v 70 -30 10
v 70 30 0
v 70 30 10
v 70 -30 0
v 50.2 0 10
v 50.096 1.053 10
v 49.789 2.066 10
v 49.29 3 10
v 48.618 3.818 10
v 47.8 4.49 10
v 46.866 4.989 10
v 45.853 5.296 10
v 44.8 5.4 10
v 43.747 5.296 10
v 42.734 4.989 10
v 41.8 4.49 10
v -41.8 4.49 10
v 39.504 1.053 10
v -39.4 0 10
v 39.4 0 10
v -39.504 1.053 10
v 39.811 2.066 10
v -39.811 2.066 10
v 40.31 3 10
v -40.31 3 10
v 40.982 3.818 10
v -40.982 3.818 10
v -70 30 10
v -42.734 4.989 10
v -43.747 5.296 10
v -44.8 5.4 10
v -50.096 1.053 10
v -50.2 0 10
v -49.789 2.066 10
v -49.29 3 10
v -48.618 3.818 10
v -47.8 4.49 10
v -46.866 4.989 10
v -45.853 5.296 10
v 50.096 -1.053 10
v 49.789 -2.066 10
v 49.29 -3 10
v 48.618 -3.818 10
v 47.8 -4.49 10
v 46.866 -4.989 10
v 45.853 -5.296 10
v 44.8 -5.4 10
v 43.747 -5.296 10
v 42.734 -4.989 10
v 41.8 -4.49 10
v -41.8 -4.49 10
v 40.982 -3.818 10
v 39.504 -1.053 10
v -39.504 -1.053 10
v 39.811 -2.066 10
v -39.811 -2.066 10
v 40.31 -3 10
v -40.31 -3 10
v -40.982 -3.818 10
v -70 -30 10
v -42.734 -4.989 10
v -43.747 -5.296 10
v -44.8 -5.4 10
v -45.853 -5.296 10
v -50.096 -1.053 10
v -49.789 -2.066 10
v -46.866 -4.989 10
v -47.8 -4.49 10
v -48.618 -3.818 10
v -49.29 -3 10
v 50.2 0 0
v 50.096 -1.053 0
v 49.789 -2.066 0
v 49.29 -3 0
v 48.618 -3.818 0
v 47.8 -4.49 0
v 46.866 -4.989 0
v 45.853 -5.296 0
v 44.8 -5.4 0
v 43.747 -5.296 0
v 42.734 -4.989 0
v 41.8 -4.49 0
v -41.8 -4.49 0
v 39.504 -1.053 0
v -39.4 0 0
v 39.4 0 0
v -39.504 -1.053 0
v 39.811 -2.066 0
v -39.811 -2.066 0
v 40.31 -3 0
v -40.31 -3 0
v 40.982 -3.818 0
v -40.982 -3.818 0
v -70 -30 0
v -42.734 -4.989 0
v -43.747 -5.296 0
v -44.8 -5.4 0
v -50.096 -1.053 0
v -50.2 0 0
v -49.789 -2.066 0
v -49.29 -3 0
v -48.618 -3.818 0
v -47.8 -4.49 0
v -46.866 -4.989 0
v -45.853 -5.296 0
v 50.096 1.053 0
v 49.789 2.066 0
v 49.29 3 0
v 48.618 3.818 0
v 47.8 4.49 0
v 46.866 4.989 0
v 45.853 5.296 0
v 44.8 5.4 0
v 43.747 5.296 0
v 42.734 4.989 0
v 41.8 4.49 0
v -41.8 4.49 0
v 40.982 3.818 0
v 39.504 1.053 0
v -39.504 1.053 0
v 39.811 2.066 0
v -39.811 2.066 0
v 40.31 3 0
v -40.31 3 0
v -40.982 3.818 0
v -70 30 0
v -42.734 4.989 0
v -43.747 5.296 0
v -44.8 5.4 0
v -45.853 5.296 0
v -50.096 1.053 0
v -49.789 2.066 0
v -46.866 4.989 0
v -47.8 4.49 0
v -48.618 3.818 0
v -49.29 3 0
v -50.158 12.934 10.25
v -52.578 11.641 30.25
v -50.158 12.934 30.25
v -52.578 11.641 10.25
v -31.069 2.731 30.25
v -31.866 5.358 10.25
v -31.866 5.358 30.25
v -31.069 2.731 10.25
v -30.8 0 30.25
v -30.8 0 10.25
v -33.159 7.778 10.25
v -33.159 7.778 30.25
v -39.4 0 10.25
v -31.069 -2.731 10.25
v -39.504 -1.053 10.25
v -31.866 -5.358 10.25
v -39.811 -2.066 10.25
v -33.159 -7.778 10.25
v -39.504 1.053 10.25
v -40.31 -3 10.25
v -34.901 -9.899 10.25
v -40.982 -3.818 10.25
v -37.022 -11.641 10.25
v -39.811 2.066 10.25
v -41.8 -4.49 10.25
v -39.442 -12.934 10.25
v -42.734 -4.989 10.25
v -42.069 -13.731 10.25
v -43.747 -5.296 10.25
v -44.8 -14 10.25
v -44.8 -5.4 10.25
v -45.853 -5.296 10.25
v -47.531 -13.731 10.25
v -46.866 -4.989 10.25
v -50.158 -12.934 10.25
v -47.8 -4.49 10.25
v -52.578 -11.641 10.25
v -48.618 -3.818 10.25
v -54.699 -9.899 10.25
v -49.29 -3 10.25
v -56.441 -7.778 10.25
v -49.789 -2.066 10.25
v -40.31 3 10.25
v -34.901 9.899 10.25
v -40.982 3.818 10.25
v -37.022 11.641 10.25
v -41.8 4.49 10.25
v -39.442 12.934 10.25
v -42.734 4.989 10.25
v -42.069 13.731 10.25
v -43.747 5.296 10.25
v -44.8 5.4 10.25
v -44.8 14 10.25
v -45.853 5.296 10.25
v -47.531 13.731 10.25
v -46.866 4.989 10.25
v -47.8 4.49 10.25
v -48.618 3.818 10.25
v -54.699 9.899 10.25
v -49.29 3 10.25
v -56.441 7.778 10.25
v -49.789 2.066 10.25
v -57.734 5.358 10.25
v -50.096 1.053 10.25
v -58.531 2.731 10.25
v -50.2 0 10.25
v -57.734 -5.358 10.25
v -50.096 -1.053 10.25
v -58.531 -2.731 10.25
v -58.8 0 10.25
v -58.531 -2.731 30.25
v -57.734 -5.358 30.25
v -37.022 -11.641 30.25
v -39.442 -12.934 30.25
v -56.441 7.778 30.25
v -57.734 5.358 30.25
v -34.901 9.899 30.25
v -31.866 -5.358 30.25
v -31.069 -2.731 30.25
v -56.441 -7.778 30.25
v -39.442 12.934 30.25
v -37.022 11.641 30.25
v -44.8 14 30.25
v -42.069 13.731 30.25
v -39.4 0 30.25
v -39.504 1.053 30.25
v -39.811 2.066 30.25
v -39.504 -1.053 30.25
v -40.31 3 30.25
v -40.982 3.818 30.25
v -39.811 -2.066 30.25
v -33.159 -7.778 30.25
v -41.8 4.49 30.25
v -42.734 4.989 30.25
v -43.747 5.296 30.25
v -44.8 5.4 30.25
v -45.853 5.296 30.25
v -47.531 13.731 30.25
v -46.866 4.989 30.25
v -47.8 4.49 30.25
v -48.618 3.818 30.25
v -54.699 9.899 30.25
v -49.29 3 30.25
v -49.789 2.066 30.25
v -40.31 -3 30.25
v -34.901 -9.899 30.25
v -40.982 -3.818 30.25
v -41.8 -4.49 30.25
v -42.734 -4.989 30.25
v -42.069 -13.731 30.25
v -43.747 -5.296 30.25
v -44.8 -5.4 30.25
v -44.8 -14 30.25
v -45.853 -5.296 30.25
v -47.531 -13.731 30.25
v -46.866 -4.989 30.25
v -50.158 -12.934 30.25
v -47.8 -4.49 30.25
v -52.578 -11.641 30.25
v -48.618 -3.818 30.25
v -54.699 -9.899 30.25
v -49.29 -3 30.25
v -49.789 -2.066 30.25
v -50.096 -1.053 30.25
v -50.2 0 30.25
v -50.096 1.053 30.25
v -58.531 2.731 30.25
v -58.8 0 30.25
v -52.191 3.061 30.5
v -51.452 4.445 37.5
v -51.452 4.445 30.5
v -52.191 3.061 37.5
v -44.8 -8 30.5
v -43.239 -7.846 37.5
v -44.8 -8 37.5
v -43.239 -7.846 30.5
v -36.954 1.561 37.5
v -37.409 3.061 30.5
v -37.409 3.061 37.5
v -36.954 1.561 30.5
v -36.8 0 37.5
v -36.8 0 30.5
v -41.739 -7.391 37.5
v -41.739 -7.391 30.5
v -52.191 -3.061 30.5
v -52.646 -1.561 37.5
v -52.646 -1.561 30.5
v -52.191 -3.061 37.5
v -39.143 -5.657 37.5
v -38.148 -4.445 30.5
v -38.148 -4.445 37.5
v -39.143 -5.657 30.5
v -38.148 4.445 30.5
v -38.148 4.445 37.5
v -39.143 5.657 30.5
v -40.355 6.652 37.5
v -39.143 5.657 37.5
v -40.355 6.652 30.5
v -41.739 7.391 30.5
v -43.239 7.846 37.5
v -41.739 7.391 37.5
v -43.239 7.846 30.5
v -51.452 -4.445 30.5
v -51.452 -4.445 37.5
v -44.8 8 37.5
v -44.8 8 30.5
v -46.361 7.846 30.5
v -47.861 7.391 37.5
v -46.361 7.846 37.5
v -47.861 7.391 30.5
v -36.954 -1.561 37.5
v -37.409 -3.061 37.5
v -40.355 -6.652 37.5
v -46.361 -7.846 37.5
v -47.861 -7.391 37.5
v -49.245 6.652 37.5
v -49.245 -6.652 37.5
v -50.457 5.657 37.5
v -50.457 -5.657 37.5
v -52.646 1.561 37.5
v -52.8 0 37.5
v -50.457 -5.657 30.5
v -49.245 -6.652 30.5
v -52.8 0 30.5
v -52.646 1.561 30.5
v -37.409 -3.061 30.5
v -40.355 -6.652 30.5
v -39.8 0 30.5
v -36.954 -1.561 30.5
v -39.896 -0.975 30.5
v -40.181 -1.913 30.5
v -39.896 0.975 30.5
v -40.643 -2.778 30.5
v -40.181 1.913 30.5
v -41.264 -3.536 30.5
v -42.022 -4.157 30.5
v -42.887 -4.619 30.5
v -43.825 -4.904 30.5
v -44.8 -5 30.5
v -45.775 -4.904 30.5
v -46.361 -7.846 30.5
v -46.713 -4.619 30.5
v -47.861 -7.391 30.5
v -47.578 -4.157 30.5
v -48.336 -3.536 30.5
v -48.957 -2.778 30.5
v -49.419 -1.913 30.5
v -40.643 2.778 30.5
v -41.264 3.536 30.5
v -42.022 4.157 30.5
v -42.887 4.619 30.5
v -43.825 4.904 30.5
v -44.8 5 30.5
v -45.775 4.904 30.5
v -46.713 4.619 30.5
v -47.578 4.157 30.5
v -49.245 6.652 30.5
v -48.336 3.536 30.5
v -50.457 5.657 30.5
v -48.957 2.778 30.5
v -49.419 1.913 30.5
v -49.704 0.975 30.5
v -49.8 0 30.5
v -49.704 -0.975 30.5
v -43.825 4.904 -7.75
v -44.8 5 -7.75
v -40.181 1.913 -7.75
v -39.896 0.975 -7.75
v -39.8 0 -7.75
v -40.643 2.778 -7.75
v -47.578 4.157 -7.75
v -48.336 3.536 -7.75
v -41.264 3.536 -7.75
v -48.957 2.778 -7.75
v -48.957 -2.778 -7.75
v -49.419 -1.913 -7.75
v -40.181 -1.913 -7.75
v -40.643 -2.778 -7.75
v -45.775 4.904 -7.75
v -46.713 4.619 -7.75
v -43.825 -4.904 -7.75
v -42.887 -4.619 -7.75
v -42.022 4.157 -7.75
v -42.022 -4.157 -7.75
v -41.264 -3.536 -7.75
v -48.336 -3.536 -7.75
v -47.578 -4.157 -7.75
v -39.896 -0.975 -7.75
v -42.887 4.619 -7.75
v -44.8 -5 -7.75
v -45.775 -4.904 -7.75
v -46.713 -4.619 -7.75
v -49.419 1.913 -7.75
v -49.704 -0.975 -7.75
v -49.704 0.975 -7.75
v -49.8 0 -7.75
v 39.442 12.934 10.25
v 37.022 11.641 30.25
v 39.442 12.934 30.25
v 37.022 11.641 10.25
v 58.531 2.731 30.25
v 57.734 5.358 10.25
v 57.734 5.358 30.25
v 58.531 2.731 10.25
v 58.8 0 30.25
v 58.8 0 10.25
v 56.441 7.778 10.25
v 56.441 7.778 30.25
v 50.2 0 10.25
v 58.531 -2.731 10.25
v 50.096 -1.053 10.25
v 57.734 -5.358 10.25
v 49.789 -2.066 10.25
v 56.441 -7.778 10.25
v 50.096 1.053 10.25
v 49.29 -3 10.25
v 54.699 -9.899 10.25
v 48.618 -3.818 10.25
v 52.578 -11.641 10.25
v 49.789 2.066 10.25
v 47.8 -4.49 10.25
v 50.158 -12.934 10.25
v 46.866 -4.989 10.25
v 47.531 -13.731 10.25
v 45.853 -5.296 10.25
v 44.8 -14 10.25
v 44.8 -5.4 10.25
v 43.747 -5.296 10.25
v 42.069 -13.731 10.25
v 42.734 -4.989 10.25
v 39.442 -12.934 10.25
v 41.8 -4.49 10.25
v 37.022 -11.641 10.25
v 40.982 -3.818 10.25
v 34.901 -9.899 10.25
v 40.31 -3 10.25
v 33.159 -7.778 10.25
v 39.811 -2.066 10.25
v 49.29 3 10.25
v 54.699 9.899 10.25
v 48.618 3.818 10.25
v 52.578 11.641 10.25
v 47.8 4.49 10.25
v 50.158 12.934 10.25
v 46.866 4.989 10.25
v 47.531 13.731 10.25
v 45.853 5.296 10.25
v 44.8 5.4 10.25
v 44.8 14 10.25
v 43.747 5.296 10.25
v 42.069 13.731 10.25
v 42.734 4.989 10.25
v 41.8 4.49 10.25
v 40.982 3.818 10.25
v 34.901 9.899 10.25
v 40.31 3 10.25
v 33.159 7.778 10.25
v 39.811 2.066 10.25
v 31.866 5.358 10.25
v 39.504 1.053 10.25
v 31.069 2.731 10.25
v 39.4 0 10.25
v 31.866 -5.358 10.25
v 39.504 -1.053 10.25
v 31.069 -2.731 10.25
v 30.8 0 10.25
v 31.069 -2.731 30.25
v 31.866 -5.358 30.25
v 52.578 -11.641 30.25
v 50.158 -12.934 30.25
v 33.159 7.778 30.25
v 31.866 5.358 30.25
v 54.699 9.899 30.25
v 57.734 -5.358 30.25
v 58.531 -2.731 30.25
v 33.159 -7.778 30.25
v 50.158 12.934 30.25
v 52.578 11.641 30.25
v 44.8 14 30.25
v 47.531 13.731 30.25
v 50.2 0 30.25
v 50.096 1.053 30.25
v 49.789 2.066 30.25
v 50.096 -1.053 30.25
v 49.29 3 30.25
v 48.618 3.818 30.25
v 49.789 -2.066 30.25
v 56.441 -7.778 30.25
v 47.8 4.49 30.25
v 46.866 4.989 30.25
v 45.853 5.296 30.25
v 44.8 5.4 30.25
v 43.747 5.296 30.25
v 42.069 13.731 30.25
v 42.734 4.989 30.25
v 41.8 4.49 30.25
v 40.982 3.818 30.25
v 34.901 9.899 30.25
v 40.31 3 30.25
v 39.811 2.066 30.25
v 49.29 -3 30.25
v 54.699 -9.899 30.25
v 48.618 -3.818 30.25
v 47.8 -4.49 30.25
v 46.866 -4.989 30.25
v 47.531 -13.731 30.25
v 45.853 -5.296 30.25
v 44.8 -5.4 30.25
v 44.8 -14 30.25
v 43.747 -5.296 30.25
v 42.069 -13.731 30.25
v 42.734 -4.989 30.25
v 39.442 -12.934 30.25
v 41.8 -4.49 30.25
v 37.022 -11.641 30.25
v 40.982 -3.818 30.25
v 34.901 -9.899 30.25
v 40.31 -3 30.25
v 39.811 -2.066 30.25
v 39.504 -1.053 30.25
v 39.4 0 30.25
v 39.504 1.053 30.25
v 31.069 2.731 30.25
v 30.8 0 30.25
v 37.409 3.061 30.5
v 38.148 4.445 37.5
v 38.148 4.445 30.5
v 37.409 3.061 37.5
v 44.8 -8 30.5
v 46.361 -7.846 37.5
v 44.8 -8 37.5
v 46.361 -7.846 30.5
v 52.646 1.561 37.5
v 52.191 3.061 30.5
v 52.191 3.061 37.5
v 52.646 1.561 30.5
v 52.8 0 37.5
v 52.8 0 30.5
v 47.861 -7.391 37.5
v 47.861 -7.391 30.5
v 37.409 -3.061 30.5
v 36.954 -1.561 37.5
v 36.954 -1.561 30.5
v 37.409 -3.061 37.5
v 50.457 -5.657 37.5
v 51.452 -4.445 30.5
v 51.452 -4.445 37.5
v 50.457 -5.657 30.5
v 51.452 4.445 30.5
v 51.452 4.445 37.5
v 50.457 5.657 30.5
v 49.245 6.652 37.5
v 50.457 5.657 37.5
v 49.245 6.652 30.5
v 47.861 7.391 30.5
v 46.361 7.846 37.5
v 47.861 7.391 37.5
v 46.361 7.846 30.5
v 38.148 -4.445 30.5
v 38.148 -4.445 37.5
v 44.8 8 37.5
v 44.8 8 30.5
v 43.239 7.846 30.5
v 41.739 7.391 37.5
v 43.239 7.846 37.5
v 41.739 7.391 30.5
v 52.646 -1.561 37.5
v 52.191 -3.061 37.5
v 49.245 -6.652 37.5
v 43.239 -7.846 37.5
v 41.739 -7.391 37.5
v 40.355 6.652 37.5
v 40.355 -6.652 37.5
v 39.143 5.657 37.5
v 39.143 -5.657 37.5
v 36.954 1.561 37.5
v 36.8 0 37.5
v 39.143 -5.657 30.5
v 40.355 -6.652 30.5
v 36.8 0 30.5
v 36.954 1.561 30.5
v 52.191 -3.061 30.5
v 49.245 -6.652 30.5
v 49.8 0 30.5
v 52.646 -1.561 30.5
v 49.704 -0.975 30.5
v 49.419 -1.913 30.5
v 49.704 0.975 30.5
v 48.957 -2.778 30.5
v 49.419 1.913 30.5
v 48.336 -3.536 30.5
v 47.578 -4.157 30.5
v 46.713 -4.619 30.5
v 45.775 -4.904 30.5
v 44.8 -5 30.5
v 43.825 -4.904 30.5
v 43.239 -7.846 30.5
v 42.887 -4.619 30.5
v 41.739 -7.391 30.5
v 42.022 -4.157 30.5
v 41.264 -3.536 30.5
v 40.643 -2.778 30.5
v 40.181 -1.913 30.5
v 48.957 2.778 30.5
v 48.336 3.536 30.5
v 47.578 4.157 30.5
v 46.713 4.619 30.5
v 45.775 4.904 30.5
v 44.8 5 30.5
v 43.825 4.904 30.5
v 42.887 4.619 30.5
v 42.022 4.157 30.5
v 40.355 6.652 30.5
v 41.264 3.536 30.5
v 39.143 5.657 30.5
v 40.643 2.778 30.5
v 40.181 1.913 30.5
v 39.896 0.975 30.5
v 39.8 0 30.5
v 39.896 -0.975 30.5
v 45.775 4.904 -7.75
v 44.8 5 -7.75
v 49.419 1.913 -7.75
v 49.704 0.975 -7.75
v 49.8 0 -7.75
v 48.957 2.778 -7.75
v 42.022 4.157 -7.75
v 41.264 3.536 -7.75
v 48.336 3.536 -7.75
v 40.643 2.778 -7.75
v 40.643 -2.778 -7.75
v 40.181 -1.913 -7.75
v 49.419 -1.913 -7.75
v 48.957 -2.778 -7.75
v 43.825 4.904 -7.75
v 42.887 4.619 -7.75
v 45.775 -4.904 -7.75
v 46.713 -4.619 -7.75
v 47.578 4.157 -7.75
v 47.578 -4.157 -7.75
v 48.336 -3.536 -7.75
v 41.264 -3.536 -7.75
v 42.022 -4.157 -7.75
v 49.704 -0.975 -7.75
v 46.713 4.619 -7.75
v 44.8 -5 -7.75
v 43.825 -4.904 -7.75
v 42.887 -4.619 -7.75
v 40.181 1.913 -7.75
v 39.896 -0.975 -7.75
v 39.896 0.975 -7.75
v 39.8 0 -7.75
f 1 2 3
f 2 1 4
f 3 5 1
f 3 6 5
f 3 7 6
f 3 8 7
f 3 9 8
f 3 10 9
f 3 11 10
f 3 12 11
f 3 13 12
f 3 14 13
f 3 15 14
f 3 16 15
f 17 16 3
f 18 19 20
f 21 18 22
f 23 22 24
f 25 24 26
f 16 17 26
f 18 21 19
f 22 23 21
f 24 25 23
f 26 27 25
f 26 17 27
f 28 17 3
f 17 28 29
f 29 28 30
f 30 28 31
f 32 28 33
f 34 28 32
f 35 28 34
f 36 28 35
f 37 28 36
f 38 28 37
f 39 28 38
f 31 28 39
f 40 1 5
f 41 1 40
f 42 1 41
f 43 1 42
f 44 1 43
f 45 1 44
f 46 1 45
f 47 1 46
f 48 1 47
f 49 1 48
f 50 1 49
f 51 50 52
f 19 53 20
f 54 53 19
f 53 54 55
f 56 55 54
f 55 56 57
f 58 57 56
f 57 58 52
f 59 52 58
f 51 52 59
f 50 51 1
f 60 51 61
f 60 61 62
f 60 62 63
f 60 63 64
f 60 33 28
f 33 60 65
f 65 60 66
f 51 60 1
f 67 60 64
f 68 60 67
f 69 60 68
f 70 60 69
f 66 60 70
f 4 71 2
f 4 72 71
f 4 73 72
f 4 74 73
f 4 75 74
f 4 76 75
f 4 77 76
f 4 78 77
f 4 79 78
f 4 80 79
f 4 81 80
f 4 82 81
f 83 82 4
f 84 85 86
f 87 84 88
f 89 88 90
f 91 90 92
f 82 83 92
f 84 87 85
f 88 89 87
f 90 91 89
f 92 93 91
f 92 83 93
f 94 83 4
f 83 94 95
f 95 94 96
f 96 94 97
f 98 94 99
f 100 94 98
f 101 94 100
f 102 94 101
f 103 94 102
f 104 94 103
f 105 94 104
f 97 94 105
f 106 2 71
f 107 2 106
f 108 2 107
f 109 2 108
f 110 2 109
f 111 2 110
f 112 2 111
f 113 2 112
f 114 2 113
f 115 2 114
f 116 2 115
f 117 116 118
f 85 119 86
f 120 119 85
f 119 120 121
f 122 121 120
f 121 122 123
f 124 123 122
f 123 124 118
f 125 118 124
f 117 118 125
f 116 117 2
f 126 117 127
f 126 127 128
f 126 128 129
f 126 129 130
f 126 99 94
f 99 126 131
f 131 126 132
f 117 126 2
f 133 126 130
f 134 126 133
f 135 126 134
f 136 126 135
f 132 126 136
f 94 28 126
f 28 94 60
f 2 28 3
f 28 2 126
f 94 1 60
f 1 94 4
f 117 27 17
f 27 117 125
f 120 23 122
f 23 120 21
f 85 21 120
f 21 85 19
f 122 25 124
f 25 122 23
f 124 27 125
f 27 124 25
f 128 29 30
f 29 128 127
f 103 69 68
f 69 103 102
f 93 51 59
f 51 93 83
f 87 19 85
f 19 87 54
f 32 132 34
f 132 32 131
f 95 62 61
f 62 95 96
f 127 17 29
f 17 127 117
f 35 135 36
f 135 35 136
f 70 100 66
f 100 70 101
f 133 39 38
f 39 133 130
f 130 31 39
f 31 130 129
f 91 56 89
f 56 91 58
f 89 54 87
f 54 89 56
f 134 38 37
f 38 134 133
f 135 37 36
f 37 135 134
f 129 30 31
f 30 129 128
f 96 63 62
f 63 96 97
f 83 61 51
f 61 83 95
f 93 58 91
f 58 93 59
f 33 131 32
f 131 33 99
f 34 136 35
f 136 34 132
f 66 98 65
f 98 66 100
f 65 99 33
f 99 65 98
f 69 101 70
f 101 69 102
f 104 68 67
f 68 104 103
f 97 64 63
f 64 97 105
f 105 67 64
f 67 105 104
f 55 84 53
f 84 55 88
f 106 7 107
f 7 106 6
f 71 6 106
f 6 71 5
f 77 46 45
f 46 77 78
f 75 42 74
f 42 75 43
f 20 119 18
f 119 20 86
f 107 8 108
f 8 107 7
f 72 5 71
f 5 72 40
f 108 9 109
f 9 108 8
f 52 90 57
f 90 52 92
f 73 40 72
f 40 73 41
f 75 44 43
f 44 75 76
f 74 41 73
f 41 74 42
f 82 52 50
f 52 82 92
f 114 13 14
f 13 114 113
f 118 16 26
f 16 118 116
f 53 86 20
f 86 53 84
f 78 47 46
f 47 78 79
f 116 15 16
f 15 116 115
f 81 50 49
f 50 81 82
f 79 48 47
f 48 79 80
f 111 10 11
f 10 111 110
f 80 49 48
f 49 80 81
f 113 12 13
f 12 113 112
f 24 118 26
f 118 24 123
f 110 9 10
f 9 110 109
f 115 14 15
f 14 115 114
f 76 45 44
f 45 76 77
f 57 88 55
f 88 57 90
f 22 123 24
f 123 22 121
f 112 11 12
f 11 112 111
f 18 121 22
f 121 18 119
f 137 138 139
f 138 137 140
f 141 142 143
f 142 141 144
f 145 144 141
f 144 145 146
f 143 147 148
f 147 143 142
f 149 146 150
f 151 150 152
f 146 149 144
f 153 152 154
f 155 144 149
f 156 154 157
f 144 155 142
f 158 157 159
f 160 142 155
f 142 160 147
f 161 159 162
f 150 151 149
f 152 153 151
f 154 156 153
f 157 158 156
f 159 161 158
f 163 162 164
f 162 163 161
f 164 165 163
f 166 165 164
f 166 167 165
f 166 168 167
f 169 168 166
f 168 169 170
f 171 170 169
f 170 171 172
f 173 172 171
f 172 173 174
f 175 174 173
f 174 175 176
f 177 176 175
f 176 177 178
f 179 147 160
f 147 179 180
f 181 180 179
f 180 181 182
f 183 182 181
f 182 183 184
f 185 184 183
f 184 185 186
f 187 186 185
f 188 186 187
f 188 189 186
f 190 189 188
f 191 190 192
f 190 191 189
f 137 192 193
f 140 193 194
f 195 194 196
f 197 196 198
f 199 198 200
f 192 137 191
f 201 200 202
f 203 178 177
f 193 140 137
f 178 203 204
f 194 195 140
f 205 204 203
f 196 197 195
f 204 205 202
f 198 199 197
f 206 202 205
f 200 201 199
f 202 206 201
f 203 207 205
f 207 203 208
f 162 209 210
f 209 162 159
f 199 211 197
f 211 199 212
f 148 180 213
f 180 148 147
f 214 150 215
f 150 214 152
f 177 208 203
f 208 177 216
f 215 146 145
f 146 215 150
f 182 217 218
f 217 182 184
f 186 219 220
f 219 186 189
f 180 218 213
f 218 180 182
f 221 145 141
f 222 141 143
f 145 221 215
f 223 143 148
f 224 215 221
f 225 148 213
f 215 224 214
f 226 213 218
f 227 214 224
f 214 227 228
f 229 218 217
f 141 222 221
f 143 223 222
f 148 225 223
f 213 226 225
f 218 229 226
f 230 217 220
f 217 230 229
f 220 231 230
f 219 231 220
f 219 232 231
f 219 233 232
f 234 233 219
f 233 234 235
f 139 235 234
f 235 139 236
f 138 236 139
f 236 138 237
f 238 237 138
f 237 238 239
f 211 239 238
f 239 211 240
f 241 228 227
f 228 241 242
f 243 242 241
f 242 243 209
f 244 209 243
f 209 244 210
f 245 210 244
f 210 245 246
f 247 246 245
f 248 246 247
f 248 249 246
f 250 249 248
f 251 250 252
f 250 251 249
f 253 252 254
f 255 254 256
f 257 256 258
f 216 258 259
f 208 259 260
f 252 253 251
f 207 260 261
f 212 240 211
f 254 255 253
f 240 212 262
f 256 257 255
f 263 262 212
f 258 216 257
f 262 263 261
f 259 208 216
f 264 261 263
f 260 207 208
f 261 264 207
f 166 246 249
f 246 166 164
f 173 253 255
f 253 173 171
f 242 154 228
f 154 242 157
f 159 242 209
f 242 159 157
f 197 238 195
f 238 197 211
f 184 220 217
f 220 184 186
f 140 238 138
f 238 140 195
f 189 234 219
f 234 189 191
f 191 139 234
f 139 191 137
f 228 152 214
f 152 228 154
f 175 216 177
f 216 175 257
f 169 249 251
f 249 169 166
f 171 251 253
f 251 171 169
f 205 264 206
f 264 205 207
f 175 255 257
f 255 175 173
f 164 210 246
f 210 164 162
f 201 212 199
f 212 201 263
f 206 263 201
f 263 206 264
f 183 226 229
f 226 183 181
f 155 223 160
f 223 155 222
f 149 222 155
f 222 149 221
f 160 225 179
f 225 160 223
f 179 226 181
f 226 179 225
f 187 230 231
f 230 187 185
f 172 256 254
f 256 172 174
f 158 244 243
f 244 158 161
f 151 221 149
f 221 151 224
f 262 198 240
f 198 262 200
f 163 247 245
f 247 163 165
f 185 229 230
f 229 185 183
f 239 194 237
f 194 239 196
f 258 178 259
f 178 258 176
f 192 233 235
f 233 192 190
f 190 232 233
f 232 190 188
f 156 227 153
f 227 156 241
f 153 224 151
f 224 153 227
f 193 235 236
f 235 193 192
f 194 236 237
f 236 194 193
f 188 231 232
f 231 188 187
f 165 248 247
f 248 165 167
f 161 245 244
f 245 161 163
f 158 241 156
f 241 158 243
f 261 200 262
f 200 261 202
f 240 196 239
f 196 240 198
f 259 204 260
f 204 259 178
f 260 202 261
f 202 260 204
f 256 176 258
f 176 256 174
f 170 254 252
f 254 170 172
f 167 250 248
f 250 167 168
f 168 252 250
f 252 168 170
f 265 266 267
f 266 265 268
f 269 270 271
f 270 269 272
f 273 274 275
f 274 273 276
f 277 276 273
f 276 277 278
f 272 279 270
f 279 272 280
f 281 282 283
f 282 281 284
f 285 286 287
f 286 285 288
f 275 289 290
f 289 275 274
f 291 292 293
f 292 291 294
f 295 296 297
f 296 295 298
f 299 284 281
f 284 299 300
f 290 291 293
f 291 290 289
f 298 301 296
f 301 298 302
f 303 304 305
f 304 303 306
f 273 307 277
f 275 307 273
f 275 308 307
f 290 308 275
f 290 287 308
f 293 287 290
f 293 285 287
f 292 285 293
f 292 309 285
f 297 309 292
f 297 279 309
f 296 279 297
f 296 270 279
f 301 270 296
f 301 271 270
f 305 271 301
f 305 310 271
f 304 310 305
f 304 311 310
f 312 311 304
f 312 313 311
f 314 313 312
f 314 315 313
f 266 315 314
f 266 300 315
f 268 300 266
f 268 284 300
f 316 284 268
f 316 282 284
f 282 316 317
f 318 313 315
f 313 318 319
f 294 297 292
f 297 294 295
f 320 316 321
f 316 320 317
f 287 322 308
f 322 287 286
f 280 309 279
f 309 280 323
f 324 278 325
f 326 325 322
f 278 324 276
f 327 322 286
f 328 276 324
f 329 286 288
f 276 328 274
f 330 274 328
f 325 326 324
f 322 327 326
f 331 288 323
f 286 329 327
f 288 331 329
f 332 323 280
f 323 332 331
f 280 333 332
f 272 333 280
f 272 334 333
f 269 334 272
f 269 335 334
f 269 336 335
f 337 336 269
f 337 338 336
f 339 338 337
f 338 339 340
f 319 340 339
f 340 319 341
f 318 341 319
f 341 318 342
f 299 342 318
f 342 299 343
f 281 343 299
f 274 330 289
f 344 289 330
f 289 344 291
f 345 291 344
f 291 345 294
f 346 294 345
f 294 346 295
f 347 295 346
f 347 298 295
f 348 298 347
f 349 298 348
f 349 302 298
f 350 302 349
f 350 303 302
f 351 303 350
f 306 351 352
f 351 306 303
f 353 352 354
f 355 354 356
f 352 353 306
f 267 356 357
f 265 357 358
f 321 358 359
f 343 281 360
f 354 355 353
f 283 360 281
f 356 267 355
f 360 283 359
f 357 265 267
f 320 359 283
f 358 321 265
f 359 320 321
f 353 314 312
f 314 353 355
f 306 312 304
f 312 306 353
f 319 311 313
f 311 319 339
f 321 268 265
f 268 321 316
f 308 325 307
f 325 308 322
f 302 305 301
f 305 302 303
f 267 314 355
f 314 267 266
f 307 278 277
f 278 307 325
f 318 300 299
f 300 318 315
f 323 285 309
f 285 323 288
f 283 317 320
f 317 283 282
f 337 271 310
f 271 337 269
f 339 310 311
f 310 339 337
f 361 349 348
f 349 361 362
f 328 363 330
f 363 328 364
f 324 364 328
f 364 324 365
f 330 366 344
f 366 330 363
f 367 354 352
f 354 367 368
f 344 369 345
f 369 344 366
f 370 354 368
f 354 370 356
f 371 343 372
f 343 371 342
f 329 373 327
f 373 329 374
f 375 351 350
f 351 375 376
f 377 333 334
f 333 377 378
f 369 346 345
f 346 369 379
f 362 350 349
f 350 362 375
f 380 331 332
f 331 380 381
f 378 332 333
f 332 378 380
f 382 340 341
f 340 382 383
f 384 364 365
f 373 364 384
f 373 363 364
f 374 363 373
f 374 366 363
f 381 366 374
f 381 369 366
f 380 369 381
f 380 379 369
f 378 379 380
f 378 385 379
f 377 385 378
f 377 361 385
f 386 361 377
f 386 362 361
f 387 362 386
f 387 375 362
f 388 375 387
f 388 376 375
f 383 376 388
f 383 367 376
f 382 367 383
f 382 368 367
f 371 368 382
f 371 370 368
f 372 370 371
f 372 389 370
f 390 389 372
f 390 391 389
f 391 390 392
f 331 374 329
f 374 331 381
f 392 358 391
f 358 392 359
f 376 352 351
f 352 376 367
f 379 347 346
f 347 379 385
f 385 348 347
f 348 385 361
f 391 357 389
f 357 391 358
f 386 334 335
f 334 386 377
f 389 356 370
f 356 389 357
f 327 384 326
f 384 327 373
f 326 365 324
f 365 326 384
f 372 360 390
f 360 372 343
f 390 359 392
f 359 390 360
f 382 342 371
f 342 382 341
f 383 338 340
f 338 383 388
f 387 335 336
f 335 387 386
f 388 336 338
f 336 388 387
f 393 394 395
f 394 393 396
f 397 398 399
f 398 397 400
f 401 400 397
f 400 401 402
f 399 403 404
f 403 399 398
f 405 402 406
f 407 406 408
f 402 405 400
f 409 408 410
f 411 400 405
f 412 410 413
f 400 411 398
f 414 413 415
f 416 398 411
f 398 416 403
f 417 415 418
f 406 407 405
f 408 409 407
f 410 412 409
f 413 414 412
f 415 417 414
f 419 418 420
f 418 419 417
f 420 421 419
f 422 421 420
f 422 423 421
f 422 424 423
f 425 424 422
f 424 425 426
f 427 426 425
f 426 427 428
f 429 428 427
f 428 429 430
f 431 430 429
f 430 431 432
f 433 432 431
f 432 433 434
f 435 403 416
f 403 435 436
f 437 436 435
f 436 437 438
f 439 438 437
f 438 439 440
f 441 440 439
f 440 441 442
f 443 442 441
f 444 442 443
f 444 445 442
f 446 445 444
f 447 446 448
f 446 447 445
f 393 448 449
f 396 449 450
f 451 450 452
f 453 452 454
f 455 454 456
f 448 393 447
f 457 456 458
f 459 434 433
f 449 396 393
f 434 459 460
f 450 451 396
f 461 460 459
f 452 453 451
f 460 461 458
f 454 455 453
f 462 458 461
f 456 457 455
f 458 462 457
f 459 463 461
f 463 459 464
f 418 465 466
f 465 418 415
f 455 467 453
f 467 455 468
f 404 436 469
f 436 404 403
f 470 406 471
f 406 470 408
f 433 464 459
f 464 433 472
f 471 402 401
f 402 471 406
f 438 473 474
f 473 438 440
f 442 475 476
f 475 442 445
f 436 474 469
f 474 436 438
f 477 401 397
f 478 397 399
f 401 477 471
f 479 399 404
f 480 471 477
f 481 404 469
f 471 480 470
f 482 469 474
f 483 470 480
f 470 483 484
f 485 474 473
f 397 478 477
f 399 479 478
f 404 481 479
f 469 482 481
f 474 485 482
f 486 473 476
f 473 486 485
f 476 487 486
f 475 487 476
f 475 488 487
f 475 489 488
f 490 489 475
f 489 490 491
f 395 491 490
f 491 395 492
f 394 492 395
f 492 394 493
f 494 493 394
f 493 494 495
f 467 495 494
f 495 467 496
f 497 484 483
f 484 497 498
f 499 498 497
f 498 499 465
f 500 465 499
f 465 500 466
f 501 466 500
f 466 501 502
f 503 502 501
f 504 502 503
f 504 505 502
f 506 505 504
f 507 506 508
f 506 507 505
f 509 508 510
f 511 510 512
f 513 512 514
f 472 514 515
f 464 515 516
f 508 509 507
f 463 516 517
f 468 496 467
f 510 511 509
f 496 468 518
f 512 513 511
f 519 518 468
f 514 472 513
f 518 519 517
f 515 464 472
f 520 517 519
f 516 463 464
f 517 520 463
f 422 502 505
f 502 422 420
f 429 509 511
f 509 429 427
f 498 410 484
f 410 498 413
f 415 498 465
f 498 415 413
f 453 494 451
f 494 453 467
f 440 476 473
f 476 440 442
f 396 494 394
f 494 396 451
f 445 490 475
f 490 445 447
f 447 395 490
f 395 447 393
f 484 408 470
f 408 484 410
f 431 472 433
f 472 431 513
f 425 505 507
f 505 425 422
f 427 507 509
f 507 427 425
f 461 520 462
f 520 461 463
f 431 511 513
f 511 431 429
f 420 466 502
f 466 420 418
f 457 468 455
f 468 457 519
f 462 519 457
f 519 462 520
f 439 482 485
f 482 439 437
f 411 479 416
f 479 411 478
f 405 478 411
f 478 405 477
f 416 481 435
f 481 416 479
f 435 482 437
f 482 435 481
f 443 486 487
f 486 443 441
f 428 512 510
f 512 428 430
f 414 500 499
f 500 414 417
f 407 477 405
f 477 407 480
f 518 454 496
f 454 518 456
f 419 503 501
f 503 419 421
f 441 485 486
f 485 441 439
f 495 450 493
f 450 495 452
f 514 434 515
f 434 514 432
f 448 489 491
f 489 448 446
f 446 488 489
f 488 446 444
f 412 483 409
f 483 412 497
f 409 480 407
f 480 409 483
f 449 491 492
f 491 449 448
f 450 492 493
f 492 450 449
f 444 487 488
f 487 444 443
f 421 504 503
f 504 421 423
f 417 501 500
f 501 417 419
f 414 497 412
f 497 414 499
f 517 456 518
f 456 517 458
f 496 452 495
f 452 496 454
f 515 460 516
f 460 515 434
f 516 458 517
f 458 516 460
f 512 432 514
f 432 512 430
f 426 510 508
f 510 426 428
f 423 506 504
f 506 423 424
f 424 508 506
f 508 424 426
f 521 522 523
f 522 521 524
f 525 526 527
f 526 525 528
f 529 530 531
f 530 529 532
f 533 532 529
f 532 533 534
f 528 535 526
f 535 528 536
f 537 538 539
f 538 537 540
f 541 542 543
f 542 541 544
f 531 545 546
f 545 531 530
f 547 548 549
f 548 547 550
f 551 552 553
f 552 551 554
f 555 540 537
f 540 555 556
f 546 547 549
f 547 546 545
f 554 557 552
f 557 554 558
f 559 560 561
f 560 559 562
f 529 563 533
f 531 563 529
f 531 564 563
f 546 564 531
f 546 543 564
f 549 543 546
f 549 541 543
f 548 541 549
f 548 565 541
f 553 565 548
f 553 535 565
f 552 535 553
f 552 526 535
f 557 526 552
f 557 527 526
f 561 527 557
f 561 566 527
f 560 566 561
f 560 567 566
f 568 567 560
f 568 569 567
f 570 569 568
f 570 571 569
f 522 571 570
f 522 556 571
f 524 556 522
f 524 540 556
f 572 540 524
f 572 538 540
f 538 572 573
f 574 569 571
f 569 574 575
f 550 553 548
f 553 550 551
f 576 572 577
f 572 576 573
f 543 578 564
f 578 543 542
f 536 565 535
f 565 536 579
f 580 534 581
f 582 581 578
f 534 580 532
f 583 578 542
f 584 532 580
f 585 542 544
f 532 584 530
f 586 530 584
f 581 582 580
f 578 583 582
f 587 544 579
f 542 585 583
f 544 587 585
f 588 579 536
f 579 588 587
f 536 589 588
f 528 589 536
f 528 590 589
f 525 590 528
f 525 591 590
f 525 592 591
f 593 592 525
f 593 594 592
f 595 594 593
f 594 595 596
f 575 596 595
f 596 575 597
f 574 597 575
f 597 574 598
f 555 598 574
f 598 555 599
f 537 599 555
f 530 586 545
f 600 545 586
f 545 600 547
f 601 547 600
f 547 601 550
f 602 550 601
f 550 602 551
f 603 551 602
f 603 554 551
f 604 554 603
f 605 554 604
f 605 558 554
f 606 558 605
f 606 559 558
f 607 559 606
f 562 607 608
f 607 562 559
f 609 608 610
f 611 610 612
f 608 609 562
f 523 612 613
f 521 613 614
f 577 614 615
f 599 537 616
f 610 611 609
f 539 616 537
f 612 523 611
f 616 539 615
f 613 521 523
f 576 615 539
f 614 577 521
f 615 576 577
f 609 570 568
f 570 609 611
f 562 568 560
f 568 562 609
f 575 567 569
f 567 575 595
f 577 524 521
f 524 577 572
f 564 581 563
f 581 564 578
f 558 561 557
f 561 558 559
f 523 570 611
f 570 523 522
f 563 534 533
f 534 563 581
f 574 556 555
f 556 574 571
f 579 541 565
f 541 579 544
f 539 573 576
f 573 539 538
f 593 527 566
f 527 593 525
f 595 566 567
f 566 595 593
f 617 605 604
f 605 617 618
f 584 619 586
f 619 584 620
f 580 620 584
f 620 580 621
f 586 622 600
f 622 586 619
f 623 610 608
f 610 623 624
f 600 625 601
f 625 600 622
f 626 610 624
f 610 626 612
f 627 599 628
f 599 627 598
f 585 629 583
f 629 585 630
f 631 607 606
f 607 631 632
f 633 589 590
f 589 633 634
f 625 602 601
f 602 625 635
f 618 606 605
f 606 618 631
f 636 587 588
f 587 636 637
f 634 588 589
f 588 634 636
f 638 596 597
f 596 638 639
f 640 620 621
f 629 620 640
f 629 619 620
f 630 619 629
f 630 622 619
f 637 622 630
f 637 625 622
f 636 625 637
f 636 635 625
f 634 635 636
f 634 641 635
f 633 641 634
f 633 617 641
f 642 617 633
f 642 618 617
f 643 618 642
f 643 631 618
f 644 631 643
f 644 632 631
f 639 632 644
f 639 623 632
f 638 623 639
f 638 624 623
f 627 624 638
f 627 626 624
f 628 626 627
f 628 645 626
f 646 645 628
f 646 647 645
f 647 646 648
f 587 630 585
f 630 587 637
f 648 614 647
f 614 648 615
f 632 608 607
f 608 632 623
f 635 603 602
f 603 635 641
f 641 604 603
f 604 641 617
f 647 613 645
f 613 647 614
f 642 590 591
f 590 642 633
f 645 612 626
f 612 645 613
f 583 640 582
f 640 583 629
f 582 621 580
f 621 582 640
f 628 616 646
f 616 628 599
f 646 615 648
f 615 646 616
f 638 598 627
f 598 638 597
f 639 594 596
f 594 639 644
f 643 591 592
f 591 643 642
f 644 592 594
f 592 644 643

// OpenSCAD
$fn = 32;

// ------------------------------------------------------------------------
// Standoff columns: 2 d28 standoffs, bolts d10
// Every part is its own module, assembly() places them once.
// ------------------------------------------------------------------------

// --- part 1 ---
module base_plate() {
  difference() {
    translate([-70, -30, 0]) cube([140, 60, 10]);
    translate([-44.8, 0, -1]) cylinder(h = 12, d = 10.8);
    translate([44.8, 0, -1]) cylinder(h = 12, d = 10.8);
  }
}

// --- part 2 ---
module spacer1() {
  difference() {
      translate([0, 0, 0]) cylinder(h = 20, d = 28);
      translate([0, 0, -1]) cylinder(h = 22, d = 10.8);
    }
}

// --- part 3 ---
module bolt1() {
  cylinder(h = 7, d = 16);
  translate([0, 0, -38.25]) cylinder(h = 38.25, d = 10);
}

// --- part 4 ---
module spacer2() {
  difference() {
      translate([0, 0, 0]) cylinder(h = 20, d = 28);
      translate([0, 0, -1]) cylinder(h = 22, d = 10.8);
    }
}

// --- part 5 ---
module bolt2() {
  cylinder(h = 7, d = 16);
  translate([0, 0, -38.25]) cylinder(h = 38.25, d = 10);
}

// --- assembly ---
module assembly() {
  translate([0, 0, 0]) rotate([0, 0, 0]) base_plate();
  translate([-44.8, 0, 10.25]) rotate([0, 0, 0]) spacer1();
  translate([-44.8, 0, 30.5]) rotate([0, 0, 0]) bolt1();
  translate([44.8, 0, 10.25]) rotate([0, 0, 0]) spacer2();
  translate([44.8, 0, 30.5]) rotate([0, 0, 0]) bolt2();
}

assembly();
